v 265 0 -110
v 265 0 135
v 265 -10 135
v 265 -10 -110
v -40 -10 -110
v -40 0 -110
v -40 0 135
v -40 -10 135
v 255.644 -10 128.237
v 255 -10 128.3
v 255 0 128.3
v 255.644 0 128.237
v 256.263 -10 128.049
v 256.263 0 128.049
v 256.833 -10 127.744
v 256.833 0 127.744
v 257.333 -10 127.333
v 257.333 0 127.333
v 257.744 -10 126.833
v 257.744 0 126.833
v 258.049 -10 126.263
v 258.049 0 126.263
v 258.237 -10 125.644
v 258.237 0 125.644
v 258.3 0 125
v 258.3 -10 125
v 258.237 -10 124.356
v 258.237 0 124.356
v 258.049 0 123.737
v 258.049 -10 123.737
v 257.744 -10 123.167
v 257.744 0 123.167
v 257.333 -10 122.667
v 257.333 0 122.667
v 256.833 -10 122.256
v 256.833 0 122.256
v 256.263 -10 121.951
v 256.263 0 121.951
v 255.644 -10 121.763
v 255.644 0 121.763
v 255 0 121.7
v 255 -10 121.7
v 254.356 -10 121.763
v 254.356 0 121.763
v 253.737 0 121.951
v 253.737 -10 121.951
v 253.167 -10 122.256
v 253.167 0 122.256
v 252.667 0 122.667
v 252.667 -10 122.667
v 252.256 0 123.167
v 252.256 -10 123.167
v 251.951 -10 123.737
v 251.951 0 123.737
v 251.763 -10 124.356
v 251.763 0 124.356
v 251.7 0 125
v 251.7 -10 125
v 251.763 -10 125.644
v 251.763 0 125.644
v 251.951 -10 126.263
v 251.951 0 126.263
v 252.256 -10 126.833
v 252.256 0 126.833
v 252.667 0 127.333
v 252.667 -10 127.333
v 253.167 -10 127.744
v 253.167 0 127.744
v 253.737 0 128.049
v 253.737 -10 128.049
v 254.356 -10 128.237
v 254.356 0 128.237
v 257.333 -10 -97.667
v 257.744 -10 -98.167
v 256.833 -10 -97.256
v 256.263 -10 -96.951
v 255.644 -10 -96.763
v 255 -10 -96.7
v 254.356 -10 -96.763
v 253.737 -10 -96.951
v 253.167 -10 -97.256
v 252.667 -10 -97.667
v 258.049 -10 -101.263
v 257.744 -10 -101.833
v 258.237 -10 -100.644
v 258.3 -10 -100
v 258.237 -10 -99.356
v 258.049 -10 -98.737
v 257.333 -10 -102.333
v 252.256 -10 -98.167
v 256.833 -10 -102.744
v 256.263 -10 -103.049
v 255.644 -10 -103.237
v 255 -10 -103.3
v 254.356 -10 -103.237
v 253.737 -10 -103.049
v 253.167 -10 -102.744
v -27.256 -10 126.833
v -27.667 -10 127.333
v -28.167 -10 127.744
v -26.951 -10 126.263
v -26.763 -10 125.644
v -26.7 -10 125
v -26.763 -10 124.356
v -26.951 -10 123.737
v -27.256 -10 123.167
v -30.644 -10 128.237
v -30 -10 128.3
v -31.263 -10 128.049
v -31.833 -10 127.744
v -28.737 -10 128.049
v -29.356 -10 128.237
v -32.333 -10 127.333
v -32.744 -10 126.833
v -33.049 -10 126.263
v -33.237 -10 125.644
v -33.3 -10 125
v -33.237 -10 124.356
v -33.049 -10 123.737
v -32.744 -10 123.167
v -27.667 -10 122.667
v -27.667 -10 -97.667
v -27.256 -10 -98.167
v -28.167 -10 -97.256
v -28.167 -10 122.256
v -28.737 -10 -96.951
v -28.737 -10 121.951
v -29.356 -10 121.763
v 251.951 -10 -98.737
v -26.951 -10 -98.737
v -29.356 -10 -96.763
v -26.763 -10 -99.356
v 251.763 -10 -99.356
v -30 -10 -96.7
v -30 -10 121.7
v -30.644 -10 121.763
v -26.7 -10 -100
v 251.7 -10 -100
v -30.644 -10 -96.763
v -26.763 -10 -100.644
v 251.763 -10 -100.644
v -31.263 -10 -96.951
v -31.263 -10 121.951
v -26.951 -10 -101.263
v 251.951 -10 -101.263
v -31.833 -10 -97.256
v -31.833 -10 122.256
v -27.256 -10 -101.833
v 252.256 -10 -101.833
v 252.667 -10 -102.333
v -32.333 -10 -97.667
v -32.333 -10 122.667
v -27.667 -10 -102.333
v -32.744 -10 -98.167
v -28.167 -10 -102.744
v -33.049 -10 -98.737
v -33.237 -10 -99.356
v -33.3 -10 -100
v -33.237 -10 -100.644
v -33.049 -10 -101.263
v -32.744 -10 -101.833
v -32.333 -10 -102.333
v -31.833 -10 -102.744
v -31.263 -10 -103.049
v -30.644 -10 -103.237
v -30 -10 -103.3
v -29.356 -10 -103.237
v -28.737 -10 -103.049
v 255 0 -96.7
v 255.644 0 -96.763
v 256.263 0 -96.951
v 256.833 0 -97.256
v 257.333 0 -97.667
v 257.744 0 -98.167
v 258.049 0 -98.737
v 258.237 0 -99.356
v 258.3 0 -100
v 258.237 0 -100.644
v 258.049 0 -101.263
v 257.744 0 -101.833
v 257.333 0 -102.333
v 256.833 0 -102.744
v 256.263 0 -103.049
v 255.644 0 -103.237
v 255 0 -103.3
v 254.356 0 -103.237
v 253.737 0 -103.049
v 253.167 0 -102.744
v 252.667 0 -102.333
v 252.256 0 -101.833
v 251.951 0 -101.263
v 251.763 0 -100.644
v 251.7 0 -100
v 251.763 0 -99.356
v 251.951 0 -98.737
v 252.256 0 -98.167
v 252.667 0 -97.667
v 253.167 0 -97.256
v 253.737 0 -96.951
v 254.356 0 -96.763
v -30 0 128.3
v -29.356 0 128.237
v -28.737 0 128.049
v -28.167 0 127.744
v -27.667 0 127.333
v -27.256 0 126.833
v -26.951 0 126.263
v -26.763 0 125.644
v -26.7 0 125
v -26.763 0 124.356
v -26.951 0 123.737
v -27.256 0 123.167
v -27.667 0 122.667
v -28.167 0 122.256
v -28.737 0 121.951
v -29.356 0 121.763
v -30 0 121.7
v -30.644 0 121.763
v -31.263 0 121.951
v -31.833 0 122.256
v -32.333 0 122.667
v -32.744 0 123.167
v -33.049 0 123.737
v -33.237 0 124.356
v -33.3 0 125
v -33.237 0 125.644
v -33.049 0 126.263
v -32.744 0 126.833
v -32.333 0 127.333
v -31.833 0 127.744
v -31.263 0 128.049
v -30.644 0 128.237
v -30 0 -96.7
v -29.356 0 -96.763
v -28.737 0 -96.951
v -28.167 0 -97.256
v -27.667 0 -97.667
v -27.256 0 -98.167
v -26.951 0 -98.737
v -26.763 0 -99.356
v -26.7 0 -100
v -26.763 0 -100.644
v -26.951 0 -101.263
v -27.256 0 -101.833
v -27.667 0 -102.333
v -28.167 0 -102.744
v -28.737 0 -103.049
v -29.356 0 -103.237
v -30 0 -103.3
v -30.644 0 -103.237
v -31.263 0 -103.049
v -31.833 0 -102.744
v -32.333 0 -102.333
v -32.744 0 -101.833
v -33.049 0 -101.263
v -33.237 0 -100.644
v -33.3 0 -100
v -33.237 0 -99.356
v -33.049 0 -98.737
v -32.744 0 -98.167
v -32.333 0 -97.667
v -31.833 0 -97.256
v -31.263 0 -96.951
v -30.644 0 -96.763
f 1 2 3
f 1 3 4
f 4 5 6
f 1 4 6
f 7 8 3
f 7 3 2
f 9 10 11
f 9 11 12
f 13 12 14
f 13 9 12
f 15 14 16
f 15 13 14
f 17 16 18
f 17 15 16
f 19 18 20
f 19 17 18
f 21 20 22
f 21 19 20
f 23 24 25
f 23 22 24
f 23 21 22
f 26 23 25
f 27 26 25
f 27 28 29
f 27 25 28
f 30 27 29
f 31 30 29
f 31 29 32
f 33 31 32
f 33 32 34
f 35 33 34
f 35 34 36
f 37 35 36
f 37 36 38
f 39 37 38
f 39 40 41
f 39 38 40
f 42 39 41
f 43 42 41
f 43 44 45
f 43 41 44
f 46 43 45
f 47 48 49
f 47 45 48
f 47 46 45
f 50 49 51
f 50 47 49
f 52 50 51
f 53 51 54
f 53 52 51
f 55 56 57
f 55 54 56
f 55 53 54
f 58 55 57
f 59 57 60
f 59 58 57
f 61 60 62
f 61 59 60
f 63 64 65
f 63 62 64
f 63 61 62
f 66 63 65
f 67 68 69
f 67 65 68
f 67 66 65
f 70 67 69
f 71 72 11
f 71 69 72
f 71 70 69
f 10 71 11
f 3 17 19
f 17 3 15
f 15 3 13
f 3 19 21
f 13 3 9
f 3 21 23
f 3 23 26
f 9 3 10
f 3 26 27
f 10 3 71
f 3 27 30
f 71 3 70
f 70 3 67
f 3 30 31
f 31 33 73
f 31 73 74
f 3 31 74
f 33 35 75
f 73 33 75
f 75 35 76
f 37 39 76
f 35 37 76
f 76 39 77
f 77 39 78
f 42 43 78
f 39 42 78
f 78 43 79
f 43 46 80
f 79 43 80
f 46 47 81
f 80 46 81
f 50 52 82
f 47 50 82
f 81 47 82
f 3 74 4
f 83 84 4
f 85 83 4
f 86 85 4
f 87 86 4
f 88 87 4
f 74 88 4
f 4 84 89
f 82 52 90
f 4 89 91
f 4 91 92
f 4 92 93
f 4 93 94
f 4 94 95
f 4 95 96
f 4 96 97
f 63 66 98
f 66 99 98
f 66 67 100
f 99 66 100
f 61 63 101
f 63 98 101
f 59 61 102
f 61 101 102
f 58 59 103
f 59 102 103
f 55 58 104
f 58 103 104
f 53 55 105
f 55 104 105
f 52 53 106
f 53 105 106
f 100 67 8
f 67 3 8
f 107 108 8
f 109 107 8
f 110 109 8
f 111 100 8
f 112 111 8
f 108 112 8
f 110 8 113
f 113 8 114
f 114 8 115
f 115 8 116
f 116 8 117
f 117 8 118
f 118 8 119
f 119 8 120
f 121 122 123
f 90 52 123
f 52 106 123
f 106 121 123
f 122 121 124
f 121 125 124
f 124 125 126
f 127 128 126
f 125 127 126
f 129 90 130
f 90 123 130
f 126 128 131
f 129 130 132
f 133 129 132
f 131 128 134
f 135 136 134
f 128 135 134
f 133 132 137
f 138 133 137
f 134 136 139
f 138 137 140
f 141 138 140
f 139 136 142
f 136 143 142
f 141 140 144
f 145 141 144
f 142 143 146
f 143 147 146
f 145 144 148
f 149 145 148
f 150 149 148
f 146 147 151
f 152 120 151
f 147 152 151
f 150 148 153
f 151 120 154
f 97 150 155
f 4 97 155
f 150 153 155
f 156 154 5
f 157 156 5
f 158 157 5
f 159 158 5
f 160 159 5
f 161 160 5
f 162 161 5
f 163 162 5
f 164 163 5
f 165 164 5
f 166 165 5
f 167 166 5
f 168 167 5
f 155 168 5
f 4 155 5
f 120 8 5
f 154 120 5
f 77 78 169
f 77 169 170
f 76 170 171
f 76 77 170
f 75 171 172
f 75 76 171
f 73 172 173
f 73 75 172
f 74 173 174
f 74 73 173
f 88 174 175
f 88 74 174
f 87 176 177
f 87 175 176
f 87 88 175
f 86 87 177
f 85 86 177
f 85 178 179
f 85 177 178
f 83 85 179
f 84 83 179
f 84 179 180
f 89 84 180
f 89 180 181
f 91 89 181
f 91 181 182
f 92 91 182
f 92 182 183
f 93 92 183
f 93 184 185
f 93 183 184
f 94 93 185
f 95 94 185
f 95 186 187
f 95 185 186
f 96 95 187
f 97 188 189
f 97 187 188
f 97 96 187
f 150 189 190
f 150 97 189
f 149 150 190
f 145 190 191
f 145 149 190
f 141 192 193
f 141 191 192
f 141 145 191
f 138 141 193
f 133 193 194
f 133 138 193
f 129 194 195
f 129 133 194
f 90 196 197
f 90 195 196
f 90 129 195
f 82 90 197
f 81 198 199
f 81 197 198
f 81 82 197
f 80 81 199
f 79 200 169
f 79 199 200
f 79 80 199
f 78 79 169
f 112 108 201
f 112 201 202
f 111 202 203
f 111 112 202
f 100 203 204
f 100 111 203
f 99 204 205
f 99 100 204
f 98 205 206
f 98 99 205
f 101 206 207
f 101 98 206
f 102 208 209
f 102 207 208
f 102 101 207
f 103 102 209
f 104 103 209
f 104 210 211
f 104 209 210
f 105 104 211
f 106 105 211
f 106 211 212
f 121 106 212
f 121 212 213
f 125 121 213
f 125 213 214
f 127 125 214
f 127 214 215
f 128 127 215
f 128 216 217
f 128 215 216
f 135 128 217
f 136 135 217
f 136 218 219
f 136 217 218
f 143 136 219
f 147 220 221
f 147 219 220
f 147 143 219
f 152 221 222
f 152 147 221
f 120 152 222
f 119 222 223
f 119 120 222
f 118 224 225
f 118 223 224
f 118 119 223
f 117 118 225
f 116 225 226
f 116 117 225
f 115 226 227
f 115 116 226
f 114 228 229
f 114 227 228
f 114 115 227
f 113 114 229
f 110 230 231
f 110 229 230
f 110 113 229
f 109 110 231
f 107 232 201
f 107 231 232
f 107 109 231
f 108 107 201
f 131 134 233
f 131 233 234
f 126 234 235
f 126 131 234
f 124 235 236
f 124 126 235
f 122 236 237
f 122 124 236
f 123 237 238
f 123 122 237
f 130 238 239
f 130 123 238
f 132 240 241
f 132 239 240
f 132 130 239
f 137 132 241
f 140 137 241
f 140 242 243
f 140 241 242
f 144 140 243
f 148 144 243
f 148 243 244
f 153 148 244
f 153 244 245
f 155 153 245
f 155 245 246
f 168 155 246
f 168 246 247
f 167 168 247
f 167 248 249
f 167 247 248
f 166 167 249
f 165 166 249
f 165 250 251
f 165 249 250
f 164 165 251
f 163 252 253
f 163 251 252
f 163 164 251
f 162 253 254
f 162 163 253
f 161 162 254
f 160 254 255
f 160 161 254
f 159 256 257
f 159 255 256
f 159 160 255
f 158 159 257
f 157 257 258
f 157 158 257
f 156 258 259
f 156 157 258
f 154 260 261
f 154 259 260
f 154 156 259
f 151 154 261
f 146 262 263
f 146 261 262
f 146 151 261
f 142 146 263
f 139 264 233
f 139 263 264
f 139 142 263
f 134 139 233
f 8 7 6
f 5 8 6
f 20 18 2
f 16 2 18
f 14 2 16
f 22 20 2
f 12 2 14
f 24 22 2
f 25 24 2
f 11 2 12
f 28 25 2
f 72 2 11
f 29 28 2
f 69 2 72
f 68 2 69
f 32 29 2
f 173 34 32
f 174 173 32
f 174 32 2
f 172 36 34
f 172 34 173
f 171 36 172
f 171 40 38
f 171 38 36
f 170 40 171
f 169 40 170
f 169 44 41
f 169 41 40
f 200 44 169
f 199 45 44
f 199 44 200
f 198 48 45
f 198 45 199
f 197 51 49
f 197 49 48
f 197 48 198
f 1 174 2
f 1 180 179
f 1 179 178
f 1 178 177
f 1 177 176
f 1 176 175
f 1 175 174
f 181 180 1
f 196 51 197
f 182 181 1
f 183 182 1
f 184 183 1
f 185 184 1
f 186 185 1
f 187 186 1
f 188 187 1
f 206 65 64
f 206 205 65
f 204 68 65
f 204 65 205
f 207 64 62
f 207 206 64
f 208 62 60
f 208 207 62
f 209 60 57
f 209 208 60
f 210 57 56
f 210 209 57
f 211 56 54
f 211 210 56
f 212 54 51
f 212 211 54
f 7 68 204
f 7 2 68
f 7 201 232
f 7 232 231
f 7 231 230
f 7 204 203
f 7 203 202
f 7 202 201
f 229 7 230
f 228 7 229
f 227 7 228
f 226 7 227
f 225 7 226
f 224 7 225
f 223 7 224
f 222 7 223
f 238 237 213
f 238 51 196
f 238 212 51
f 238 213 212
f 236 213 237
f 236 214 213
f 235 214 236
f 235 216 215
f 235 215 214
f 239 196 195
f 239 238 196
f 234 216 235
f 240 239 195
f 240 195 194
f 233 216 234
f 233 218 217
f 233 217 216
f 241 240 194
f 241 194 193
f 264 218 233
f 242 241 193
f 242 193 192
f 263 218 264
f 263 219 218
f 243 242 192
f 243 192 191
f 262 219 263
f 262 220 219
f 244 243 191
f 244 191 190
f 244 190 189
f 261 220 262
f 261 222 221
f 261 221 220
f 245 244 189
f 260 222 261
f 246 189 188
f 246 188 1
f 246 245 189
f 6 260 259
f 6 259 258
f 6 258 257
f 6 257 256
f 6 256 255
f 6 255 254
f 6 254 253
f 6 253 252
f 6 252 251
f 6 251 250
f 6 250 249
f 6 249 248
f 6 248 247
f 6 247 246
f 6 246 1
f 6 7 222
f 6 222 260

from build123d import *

# Parameters (mm, degrees)
PLATE_START      = -40
SKETCH1_W        = 245
SKETCH1_H        = 10
PLATE_DEPTH      = 305
EXTRUDE_START    = -12
SKETCH2_R        = 3.3
EXTRUDE_H0_DEPTH = 14
SKETCH3_R        = 3.3
EXTRUDE_H1_DEPTH = 14
SKETCH4_R        = 3.3
EXTRUDE_H2_DEPTH = 14
SKETCH5_R        = 3.3
EXTRUDE_H3_DEPTH = 14


with BuildPart() as part:
    # Sketch1 → plate (new body)
    with BuildSketch(Plane(origin=(0, 0, 0), x_dir=(0, 0, -1), z_dir=(1, 0, 0)).offset(PLATE_START)):
        with Locations((-12.5, -5)):
            Rectangle(SKETCH1_W, SKETCH1_H)
    extrude(amount=PLATE_DEPTH)


with BuildPart() as body_2:
    # Sketch2 → Extrude h0 (new body)
    with BuildSketch(Plane(origin=(0, 0, 0), x_dir=(1, 0, 0), z_dir=(0, 1, 0)).offset(EXTRUDE_START)):
        with Locations((-30, 100)):
            Circle(SKETCH2_R)
    extrude(amount=EXTRUDE_H0_DEPTH)


with BuildPart() as part_1:
    add(part.part)

    # Combine1: cut body 2
    add(body_2.part, mode=Mode.SUBTRACT)


with BuildPart() as body_2_2:
    # Sketch3 → Extrude h1 (new body)
    with BuildSketch(Plane(origin=(0, 0, 0), x_dir=(1, 0, 0), z_dir=(0, 1, 0)).offset(EXTRUDE_START)):
        with Locations((-30, -125)):
            Circle(SKETCH3_R)
    extrude(amount=EXTRUDE_H1_DEPTH)


with BuildPart() as part_2:
    add(part_1.part)

    # Combine2: cut body 2 2
    add(body_2_2.part, mode=Mode.SUBTRACT)


with BuildPart() as body_2_3:
    # Sketch4 → Extrude h2 (new body)
    with BuildSketch(Plane(origin=(0, 0, 0), x_dir=(1, 0, 0), z_dir=(0, 1, 0)).offset(EXTRUDE_START)):
        with Locations((255, 100)):
            Circle(SKETCH4_R)
    extrude(amount=EXTRUDE_H2_DEPTH)


with BuildPart() as part_3:
    add(part_2.part)

    # Combine3: cut body 2 3
    add(body_2_3.part, mode=Mode.SUBTRACT)


with BuildPart() as body_2_4:
    # Sketch5 → Extrude h3 (new body)
    with BuildSketch(Plane(origin=(0, 0, 0), x_dir=(1, 0, 0), z_dir=(0, 1, 0)).offset(EXTRUDE_START)):
        with Locations((255, -125)):
            Circle(SKETCH5_R)
    extrude(amount=EXTRUDE_H3_DEPTH)


with BuildPart() as part_4:
    add(part_3.part)

    # Combine4: cut body 2 4
    add(body_2_4.part, mode=Mode.SUBTRACT)


solid = part_4.part
